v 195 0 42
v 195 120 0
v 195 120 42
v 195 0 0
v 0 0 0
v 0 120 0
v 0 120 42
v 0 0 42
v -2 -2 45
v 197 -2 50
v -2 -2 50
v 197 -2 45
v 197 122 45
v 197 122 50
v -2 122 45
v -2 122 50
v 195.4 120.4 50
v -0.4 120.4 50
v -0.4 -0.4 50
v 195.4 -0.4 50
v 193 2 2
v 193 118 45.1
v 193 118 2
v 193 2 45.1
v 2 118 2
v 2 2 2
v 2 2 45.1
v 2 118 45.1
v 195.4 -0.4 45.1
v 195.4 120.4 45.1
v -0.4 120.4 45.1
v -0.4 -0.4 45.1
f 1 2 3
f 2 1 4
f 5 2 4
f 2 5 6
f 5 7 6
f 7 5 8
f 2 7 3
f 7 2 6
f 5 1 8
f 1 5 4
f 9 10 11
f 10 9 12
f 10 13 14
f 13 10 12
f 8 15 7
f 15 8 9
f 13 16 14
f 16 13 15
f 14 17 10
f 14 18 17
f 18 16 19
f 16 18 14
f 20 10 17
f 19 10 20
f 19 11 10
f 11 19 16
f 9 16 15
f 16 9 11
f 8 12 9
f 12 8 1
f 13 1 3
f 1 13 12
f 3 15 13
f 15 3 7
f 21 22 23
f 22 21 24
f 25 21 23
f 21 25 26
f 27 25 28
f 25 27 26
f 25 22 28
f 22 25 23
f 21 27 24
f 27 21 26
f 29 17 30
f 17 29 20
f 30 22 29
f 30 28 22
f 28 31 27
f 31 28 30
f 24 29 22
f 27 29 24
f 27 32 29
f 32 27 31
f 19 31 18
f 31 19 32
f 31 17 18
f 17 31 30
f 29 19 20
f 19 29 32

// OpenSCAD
// Length of Box (X-Axis)
Length=195;		// [20:500]

// Width of Box (Y-Axis)
Width=120;		// [20:500]

// Height of Box (Z-Axis)
Height=50;		// [15:500]

// Wall Thickness
Wall=2;			// [0.5:0.1:5]


difference()
{
	union()
	{
		cube([Length, Width, Height - 5 - 2]);
		translate([0, 0, Height - 5 - 2]) hull()
		{
			translate([0, 0, -1]) cube([Length, Width, 1]);
			translate([-Wall, -Wall, 2]) cube([Length + Wall * 2, Width + Wall * 2, 5]);
		}
		translate([0, 0, Height]) cube([Length, Width, 2]);
	}
	
	translate([Wall, Wall, Wall]) cube([Length - Wall * 2, Width - Wall * 2, Height + Wall]);
	
	translate([-0.4, -0.4, Height - 5 + 0.1]) cube([Length + 0.8, Width + 0.8, 7]);
}
